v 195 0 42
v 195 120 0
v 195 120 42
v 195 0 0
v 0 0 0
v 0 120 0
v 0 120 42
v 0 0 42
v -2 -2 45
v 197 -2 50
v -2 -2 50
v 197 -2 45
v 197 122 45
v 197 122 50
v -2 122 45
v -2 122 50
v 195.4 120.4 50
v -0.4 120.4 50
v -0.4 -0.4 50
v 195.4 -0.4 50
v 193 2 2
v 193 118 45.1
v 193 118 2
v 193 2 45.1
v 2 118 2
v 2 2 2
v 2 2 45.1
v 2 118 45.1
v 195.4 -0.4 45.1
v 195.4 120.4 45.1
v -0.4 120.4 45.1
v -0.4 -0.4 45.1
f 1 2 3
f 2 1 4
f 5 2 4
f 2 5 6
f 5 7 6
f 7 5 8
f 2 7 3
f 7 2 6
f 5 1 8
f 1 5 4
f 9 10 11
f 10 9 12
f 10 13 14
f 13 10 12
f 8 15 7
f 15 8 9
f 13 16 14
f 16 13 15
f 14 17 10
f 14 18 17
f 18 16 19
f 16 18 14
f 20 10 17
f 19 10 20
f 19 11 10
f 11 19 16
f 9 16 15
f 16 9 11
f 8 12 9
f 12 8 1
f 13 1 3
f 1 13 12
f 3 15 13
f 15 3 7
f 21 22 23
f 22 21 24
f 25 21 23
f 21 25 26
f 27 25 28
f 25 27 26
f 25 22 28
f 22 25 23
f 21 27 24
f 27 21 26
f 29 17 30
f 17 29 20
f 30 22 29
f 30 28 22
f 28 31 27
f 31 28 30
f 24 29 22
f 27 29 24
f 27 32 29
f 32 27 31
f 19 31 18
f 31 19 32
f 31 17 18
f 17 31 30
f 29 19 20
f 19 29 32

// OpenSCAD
// Length of Box (X-Axis)
Length=195;		// [20:500]

// Width of Box (Y-Axis)
Width=120;		// [20:500]

// Height of Box (Z-Axis)
Height=50;		// [15:500]

// Wall Thickness
Wall=2;			// [0.5:0.1:5]


difference()
{
	union()
	{
		cube([Length, Width, Height - 5 - 2]);
		translate([0, 0, Height - 5 - 2]) hull()
		{
			translate([0, 0, -1]) cube([Length, Width, 1]);
			translate([-Wall, -Wall, 2]) cube([Length + Wall * 2, Width + Wall * 2, 5]);
		}
		translate([0, 0, Height]) cube([Length, Width, 2]);
	}
	
	translate([Wall, Wall, Wall]) cube([Length - Wall * 2, Width - Wall * 2, Height + Wall]);
	
	translate([-0.4, -0.4, Height - 5 + 0.1]) cube([Length + 0.8, Width + 0.8, 7]);
}
